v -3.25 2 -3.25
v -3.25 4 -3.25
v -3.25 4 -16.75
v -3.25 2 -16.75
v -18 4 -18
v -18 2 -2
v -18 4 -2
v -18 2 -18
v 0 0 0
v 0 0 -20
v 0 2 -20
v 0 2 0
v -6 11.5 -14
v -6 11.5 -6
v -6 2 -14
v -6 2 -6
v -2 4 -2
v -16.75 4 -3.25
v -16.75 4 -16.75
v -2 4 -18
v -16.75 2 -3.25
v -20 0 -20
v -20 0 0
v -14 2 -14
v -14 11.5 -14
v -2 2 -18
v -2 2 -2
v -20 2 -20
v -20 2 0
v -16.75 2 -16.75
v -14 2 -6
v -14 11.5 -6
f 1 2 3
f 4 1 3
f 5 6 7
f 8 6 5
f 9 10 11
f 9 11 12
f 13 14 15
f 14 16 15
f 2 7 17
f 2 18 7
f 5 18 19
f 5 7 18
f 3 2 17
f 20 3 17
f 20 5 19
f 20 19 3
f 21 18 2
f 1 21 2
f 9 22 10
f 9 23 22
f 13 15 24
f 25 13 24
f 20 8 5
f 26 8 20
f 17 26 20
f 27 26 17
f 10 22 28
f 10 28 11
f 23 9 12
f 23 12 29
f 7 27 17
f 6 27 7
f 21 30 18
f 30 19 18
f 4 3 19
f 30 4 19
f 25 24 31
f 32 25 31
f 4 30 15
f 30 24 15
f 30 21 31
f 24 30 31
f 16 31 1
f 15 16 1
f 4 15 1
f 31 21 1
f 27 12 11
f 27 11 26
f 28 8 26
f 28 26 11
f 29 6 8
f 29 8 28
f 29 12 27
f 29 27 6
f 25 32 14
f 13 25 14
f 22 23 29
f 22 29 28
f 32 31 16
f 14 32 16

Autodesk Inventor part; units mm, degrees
ref_plane "YZ Plane" through (0, 0, 0) normal (1, 0, 0) x (0, 1, 0)
ref_plane "XZ Plane" through (0, 0, 0) normal (0, 1, 0) x (-1, 0, 0)
ref_plane "XY Plane" through (0, 0, 0) normal (0, 0, 1) x (1, 0, 0)
sketch "Sketch1" plane through (0, 0, 0) normal (0, 1, 0) x (-1, 0, 0)
  line L0 (0, 0) -> (20, 0)
  line L1 (20, 0) -> (20, -20)
  line L2 (20, -20) -> (0, -20)
  line L3 (0, -20) -> (0, 0)
  dimension "d0" = 20
  dimension "d1" = 20
extrude "Extrusion1" add sketch "Sketch1" along normal blind 2
sketch "Sketch2" plane through (0, 2, 0) normal (0, 1, 0) x (1, 0, 0)
  line L0 (0, 20) -> (-20, 20) projected
  line L1 (-20, 20) -> (-20, 0) projected
  line L2 (-20, 0) -> (0, 0) projected
  line L3 (0, 0) -> (0, 20) projected
  line L4 (-18, 2) -> (-18, 18)
  line L5 (-18, 18) -> (-2, 18)
  line L6 (-2, 18) -> (-2, 2)
  line L7 (-2, 2) -> (-18, 2)
  line L8 (-16.75, 16.75) -> (-16.75, 3.25)
  line L9 (-16.75, 3.25) -> (-3.25, 3.25)
  line L10 (-3.25, 3.25) -> (-3.25, 16.75)
  line L11 (-3.25, 16.75) -> (-16.75, 16.75)
  dimension "d4" = 2
  dimension "d5" = 1.25
extrude "Extrusion2" add sketch "Sketch2" along normal blind 2 contours L4 L5 L6 L7
extrude "Extrusion3" cut sketch "Sketch2" against normal blind 10 contours L11 L10 L9 L8
sketch "Sketch3" plane through (0, 0, 0) normal (0, -1, 0) x (1, 0, 0)
  line L0 (-3.25, -3.25) -> (-3.25, -16.75) projected
  line L1 (-3.25, -16.75) -> (-16.75, -16.75) projected
  line L2 (-16.75, -16.75) -> (-16.75, -3.25) projected
  line L3 (-16.75, -3.25) -> (-3.25, -3.25) projected
  line L4 (0, -20) -> (-20, -20) projected
  line L5 (0, 0) -> (0, -20) projected
  line L6 (-20, 0) -> (0, 0) projected
  line L7 (-20, -20) -> (-20, 0) projected
  line L8 (-6, -6) -> (-6, -14)
  line L9 (-6, -14) -> (-14, -14)
  line L10 (-14, -14) -> (-14, -6)
  line L11 (-14, -6) -> (-6, -6)
extrude "Extrusion4" add sketch "Sketch3" against normal up to surface (2 mm away) contours L0 L1 L2 L3
extrude "Extrusion5" add sketch "Sketch3" against normal blind 11.5 contours L8 L9 L10 L11
properties part number "latticeChamberCapv4"
